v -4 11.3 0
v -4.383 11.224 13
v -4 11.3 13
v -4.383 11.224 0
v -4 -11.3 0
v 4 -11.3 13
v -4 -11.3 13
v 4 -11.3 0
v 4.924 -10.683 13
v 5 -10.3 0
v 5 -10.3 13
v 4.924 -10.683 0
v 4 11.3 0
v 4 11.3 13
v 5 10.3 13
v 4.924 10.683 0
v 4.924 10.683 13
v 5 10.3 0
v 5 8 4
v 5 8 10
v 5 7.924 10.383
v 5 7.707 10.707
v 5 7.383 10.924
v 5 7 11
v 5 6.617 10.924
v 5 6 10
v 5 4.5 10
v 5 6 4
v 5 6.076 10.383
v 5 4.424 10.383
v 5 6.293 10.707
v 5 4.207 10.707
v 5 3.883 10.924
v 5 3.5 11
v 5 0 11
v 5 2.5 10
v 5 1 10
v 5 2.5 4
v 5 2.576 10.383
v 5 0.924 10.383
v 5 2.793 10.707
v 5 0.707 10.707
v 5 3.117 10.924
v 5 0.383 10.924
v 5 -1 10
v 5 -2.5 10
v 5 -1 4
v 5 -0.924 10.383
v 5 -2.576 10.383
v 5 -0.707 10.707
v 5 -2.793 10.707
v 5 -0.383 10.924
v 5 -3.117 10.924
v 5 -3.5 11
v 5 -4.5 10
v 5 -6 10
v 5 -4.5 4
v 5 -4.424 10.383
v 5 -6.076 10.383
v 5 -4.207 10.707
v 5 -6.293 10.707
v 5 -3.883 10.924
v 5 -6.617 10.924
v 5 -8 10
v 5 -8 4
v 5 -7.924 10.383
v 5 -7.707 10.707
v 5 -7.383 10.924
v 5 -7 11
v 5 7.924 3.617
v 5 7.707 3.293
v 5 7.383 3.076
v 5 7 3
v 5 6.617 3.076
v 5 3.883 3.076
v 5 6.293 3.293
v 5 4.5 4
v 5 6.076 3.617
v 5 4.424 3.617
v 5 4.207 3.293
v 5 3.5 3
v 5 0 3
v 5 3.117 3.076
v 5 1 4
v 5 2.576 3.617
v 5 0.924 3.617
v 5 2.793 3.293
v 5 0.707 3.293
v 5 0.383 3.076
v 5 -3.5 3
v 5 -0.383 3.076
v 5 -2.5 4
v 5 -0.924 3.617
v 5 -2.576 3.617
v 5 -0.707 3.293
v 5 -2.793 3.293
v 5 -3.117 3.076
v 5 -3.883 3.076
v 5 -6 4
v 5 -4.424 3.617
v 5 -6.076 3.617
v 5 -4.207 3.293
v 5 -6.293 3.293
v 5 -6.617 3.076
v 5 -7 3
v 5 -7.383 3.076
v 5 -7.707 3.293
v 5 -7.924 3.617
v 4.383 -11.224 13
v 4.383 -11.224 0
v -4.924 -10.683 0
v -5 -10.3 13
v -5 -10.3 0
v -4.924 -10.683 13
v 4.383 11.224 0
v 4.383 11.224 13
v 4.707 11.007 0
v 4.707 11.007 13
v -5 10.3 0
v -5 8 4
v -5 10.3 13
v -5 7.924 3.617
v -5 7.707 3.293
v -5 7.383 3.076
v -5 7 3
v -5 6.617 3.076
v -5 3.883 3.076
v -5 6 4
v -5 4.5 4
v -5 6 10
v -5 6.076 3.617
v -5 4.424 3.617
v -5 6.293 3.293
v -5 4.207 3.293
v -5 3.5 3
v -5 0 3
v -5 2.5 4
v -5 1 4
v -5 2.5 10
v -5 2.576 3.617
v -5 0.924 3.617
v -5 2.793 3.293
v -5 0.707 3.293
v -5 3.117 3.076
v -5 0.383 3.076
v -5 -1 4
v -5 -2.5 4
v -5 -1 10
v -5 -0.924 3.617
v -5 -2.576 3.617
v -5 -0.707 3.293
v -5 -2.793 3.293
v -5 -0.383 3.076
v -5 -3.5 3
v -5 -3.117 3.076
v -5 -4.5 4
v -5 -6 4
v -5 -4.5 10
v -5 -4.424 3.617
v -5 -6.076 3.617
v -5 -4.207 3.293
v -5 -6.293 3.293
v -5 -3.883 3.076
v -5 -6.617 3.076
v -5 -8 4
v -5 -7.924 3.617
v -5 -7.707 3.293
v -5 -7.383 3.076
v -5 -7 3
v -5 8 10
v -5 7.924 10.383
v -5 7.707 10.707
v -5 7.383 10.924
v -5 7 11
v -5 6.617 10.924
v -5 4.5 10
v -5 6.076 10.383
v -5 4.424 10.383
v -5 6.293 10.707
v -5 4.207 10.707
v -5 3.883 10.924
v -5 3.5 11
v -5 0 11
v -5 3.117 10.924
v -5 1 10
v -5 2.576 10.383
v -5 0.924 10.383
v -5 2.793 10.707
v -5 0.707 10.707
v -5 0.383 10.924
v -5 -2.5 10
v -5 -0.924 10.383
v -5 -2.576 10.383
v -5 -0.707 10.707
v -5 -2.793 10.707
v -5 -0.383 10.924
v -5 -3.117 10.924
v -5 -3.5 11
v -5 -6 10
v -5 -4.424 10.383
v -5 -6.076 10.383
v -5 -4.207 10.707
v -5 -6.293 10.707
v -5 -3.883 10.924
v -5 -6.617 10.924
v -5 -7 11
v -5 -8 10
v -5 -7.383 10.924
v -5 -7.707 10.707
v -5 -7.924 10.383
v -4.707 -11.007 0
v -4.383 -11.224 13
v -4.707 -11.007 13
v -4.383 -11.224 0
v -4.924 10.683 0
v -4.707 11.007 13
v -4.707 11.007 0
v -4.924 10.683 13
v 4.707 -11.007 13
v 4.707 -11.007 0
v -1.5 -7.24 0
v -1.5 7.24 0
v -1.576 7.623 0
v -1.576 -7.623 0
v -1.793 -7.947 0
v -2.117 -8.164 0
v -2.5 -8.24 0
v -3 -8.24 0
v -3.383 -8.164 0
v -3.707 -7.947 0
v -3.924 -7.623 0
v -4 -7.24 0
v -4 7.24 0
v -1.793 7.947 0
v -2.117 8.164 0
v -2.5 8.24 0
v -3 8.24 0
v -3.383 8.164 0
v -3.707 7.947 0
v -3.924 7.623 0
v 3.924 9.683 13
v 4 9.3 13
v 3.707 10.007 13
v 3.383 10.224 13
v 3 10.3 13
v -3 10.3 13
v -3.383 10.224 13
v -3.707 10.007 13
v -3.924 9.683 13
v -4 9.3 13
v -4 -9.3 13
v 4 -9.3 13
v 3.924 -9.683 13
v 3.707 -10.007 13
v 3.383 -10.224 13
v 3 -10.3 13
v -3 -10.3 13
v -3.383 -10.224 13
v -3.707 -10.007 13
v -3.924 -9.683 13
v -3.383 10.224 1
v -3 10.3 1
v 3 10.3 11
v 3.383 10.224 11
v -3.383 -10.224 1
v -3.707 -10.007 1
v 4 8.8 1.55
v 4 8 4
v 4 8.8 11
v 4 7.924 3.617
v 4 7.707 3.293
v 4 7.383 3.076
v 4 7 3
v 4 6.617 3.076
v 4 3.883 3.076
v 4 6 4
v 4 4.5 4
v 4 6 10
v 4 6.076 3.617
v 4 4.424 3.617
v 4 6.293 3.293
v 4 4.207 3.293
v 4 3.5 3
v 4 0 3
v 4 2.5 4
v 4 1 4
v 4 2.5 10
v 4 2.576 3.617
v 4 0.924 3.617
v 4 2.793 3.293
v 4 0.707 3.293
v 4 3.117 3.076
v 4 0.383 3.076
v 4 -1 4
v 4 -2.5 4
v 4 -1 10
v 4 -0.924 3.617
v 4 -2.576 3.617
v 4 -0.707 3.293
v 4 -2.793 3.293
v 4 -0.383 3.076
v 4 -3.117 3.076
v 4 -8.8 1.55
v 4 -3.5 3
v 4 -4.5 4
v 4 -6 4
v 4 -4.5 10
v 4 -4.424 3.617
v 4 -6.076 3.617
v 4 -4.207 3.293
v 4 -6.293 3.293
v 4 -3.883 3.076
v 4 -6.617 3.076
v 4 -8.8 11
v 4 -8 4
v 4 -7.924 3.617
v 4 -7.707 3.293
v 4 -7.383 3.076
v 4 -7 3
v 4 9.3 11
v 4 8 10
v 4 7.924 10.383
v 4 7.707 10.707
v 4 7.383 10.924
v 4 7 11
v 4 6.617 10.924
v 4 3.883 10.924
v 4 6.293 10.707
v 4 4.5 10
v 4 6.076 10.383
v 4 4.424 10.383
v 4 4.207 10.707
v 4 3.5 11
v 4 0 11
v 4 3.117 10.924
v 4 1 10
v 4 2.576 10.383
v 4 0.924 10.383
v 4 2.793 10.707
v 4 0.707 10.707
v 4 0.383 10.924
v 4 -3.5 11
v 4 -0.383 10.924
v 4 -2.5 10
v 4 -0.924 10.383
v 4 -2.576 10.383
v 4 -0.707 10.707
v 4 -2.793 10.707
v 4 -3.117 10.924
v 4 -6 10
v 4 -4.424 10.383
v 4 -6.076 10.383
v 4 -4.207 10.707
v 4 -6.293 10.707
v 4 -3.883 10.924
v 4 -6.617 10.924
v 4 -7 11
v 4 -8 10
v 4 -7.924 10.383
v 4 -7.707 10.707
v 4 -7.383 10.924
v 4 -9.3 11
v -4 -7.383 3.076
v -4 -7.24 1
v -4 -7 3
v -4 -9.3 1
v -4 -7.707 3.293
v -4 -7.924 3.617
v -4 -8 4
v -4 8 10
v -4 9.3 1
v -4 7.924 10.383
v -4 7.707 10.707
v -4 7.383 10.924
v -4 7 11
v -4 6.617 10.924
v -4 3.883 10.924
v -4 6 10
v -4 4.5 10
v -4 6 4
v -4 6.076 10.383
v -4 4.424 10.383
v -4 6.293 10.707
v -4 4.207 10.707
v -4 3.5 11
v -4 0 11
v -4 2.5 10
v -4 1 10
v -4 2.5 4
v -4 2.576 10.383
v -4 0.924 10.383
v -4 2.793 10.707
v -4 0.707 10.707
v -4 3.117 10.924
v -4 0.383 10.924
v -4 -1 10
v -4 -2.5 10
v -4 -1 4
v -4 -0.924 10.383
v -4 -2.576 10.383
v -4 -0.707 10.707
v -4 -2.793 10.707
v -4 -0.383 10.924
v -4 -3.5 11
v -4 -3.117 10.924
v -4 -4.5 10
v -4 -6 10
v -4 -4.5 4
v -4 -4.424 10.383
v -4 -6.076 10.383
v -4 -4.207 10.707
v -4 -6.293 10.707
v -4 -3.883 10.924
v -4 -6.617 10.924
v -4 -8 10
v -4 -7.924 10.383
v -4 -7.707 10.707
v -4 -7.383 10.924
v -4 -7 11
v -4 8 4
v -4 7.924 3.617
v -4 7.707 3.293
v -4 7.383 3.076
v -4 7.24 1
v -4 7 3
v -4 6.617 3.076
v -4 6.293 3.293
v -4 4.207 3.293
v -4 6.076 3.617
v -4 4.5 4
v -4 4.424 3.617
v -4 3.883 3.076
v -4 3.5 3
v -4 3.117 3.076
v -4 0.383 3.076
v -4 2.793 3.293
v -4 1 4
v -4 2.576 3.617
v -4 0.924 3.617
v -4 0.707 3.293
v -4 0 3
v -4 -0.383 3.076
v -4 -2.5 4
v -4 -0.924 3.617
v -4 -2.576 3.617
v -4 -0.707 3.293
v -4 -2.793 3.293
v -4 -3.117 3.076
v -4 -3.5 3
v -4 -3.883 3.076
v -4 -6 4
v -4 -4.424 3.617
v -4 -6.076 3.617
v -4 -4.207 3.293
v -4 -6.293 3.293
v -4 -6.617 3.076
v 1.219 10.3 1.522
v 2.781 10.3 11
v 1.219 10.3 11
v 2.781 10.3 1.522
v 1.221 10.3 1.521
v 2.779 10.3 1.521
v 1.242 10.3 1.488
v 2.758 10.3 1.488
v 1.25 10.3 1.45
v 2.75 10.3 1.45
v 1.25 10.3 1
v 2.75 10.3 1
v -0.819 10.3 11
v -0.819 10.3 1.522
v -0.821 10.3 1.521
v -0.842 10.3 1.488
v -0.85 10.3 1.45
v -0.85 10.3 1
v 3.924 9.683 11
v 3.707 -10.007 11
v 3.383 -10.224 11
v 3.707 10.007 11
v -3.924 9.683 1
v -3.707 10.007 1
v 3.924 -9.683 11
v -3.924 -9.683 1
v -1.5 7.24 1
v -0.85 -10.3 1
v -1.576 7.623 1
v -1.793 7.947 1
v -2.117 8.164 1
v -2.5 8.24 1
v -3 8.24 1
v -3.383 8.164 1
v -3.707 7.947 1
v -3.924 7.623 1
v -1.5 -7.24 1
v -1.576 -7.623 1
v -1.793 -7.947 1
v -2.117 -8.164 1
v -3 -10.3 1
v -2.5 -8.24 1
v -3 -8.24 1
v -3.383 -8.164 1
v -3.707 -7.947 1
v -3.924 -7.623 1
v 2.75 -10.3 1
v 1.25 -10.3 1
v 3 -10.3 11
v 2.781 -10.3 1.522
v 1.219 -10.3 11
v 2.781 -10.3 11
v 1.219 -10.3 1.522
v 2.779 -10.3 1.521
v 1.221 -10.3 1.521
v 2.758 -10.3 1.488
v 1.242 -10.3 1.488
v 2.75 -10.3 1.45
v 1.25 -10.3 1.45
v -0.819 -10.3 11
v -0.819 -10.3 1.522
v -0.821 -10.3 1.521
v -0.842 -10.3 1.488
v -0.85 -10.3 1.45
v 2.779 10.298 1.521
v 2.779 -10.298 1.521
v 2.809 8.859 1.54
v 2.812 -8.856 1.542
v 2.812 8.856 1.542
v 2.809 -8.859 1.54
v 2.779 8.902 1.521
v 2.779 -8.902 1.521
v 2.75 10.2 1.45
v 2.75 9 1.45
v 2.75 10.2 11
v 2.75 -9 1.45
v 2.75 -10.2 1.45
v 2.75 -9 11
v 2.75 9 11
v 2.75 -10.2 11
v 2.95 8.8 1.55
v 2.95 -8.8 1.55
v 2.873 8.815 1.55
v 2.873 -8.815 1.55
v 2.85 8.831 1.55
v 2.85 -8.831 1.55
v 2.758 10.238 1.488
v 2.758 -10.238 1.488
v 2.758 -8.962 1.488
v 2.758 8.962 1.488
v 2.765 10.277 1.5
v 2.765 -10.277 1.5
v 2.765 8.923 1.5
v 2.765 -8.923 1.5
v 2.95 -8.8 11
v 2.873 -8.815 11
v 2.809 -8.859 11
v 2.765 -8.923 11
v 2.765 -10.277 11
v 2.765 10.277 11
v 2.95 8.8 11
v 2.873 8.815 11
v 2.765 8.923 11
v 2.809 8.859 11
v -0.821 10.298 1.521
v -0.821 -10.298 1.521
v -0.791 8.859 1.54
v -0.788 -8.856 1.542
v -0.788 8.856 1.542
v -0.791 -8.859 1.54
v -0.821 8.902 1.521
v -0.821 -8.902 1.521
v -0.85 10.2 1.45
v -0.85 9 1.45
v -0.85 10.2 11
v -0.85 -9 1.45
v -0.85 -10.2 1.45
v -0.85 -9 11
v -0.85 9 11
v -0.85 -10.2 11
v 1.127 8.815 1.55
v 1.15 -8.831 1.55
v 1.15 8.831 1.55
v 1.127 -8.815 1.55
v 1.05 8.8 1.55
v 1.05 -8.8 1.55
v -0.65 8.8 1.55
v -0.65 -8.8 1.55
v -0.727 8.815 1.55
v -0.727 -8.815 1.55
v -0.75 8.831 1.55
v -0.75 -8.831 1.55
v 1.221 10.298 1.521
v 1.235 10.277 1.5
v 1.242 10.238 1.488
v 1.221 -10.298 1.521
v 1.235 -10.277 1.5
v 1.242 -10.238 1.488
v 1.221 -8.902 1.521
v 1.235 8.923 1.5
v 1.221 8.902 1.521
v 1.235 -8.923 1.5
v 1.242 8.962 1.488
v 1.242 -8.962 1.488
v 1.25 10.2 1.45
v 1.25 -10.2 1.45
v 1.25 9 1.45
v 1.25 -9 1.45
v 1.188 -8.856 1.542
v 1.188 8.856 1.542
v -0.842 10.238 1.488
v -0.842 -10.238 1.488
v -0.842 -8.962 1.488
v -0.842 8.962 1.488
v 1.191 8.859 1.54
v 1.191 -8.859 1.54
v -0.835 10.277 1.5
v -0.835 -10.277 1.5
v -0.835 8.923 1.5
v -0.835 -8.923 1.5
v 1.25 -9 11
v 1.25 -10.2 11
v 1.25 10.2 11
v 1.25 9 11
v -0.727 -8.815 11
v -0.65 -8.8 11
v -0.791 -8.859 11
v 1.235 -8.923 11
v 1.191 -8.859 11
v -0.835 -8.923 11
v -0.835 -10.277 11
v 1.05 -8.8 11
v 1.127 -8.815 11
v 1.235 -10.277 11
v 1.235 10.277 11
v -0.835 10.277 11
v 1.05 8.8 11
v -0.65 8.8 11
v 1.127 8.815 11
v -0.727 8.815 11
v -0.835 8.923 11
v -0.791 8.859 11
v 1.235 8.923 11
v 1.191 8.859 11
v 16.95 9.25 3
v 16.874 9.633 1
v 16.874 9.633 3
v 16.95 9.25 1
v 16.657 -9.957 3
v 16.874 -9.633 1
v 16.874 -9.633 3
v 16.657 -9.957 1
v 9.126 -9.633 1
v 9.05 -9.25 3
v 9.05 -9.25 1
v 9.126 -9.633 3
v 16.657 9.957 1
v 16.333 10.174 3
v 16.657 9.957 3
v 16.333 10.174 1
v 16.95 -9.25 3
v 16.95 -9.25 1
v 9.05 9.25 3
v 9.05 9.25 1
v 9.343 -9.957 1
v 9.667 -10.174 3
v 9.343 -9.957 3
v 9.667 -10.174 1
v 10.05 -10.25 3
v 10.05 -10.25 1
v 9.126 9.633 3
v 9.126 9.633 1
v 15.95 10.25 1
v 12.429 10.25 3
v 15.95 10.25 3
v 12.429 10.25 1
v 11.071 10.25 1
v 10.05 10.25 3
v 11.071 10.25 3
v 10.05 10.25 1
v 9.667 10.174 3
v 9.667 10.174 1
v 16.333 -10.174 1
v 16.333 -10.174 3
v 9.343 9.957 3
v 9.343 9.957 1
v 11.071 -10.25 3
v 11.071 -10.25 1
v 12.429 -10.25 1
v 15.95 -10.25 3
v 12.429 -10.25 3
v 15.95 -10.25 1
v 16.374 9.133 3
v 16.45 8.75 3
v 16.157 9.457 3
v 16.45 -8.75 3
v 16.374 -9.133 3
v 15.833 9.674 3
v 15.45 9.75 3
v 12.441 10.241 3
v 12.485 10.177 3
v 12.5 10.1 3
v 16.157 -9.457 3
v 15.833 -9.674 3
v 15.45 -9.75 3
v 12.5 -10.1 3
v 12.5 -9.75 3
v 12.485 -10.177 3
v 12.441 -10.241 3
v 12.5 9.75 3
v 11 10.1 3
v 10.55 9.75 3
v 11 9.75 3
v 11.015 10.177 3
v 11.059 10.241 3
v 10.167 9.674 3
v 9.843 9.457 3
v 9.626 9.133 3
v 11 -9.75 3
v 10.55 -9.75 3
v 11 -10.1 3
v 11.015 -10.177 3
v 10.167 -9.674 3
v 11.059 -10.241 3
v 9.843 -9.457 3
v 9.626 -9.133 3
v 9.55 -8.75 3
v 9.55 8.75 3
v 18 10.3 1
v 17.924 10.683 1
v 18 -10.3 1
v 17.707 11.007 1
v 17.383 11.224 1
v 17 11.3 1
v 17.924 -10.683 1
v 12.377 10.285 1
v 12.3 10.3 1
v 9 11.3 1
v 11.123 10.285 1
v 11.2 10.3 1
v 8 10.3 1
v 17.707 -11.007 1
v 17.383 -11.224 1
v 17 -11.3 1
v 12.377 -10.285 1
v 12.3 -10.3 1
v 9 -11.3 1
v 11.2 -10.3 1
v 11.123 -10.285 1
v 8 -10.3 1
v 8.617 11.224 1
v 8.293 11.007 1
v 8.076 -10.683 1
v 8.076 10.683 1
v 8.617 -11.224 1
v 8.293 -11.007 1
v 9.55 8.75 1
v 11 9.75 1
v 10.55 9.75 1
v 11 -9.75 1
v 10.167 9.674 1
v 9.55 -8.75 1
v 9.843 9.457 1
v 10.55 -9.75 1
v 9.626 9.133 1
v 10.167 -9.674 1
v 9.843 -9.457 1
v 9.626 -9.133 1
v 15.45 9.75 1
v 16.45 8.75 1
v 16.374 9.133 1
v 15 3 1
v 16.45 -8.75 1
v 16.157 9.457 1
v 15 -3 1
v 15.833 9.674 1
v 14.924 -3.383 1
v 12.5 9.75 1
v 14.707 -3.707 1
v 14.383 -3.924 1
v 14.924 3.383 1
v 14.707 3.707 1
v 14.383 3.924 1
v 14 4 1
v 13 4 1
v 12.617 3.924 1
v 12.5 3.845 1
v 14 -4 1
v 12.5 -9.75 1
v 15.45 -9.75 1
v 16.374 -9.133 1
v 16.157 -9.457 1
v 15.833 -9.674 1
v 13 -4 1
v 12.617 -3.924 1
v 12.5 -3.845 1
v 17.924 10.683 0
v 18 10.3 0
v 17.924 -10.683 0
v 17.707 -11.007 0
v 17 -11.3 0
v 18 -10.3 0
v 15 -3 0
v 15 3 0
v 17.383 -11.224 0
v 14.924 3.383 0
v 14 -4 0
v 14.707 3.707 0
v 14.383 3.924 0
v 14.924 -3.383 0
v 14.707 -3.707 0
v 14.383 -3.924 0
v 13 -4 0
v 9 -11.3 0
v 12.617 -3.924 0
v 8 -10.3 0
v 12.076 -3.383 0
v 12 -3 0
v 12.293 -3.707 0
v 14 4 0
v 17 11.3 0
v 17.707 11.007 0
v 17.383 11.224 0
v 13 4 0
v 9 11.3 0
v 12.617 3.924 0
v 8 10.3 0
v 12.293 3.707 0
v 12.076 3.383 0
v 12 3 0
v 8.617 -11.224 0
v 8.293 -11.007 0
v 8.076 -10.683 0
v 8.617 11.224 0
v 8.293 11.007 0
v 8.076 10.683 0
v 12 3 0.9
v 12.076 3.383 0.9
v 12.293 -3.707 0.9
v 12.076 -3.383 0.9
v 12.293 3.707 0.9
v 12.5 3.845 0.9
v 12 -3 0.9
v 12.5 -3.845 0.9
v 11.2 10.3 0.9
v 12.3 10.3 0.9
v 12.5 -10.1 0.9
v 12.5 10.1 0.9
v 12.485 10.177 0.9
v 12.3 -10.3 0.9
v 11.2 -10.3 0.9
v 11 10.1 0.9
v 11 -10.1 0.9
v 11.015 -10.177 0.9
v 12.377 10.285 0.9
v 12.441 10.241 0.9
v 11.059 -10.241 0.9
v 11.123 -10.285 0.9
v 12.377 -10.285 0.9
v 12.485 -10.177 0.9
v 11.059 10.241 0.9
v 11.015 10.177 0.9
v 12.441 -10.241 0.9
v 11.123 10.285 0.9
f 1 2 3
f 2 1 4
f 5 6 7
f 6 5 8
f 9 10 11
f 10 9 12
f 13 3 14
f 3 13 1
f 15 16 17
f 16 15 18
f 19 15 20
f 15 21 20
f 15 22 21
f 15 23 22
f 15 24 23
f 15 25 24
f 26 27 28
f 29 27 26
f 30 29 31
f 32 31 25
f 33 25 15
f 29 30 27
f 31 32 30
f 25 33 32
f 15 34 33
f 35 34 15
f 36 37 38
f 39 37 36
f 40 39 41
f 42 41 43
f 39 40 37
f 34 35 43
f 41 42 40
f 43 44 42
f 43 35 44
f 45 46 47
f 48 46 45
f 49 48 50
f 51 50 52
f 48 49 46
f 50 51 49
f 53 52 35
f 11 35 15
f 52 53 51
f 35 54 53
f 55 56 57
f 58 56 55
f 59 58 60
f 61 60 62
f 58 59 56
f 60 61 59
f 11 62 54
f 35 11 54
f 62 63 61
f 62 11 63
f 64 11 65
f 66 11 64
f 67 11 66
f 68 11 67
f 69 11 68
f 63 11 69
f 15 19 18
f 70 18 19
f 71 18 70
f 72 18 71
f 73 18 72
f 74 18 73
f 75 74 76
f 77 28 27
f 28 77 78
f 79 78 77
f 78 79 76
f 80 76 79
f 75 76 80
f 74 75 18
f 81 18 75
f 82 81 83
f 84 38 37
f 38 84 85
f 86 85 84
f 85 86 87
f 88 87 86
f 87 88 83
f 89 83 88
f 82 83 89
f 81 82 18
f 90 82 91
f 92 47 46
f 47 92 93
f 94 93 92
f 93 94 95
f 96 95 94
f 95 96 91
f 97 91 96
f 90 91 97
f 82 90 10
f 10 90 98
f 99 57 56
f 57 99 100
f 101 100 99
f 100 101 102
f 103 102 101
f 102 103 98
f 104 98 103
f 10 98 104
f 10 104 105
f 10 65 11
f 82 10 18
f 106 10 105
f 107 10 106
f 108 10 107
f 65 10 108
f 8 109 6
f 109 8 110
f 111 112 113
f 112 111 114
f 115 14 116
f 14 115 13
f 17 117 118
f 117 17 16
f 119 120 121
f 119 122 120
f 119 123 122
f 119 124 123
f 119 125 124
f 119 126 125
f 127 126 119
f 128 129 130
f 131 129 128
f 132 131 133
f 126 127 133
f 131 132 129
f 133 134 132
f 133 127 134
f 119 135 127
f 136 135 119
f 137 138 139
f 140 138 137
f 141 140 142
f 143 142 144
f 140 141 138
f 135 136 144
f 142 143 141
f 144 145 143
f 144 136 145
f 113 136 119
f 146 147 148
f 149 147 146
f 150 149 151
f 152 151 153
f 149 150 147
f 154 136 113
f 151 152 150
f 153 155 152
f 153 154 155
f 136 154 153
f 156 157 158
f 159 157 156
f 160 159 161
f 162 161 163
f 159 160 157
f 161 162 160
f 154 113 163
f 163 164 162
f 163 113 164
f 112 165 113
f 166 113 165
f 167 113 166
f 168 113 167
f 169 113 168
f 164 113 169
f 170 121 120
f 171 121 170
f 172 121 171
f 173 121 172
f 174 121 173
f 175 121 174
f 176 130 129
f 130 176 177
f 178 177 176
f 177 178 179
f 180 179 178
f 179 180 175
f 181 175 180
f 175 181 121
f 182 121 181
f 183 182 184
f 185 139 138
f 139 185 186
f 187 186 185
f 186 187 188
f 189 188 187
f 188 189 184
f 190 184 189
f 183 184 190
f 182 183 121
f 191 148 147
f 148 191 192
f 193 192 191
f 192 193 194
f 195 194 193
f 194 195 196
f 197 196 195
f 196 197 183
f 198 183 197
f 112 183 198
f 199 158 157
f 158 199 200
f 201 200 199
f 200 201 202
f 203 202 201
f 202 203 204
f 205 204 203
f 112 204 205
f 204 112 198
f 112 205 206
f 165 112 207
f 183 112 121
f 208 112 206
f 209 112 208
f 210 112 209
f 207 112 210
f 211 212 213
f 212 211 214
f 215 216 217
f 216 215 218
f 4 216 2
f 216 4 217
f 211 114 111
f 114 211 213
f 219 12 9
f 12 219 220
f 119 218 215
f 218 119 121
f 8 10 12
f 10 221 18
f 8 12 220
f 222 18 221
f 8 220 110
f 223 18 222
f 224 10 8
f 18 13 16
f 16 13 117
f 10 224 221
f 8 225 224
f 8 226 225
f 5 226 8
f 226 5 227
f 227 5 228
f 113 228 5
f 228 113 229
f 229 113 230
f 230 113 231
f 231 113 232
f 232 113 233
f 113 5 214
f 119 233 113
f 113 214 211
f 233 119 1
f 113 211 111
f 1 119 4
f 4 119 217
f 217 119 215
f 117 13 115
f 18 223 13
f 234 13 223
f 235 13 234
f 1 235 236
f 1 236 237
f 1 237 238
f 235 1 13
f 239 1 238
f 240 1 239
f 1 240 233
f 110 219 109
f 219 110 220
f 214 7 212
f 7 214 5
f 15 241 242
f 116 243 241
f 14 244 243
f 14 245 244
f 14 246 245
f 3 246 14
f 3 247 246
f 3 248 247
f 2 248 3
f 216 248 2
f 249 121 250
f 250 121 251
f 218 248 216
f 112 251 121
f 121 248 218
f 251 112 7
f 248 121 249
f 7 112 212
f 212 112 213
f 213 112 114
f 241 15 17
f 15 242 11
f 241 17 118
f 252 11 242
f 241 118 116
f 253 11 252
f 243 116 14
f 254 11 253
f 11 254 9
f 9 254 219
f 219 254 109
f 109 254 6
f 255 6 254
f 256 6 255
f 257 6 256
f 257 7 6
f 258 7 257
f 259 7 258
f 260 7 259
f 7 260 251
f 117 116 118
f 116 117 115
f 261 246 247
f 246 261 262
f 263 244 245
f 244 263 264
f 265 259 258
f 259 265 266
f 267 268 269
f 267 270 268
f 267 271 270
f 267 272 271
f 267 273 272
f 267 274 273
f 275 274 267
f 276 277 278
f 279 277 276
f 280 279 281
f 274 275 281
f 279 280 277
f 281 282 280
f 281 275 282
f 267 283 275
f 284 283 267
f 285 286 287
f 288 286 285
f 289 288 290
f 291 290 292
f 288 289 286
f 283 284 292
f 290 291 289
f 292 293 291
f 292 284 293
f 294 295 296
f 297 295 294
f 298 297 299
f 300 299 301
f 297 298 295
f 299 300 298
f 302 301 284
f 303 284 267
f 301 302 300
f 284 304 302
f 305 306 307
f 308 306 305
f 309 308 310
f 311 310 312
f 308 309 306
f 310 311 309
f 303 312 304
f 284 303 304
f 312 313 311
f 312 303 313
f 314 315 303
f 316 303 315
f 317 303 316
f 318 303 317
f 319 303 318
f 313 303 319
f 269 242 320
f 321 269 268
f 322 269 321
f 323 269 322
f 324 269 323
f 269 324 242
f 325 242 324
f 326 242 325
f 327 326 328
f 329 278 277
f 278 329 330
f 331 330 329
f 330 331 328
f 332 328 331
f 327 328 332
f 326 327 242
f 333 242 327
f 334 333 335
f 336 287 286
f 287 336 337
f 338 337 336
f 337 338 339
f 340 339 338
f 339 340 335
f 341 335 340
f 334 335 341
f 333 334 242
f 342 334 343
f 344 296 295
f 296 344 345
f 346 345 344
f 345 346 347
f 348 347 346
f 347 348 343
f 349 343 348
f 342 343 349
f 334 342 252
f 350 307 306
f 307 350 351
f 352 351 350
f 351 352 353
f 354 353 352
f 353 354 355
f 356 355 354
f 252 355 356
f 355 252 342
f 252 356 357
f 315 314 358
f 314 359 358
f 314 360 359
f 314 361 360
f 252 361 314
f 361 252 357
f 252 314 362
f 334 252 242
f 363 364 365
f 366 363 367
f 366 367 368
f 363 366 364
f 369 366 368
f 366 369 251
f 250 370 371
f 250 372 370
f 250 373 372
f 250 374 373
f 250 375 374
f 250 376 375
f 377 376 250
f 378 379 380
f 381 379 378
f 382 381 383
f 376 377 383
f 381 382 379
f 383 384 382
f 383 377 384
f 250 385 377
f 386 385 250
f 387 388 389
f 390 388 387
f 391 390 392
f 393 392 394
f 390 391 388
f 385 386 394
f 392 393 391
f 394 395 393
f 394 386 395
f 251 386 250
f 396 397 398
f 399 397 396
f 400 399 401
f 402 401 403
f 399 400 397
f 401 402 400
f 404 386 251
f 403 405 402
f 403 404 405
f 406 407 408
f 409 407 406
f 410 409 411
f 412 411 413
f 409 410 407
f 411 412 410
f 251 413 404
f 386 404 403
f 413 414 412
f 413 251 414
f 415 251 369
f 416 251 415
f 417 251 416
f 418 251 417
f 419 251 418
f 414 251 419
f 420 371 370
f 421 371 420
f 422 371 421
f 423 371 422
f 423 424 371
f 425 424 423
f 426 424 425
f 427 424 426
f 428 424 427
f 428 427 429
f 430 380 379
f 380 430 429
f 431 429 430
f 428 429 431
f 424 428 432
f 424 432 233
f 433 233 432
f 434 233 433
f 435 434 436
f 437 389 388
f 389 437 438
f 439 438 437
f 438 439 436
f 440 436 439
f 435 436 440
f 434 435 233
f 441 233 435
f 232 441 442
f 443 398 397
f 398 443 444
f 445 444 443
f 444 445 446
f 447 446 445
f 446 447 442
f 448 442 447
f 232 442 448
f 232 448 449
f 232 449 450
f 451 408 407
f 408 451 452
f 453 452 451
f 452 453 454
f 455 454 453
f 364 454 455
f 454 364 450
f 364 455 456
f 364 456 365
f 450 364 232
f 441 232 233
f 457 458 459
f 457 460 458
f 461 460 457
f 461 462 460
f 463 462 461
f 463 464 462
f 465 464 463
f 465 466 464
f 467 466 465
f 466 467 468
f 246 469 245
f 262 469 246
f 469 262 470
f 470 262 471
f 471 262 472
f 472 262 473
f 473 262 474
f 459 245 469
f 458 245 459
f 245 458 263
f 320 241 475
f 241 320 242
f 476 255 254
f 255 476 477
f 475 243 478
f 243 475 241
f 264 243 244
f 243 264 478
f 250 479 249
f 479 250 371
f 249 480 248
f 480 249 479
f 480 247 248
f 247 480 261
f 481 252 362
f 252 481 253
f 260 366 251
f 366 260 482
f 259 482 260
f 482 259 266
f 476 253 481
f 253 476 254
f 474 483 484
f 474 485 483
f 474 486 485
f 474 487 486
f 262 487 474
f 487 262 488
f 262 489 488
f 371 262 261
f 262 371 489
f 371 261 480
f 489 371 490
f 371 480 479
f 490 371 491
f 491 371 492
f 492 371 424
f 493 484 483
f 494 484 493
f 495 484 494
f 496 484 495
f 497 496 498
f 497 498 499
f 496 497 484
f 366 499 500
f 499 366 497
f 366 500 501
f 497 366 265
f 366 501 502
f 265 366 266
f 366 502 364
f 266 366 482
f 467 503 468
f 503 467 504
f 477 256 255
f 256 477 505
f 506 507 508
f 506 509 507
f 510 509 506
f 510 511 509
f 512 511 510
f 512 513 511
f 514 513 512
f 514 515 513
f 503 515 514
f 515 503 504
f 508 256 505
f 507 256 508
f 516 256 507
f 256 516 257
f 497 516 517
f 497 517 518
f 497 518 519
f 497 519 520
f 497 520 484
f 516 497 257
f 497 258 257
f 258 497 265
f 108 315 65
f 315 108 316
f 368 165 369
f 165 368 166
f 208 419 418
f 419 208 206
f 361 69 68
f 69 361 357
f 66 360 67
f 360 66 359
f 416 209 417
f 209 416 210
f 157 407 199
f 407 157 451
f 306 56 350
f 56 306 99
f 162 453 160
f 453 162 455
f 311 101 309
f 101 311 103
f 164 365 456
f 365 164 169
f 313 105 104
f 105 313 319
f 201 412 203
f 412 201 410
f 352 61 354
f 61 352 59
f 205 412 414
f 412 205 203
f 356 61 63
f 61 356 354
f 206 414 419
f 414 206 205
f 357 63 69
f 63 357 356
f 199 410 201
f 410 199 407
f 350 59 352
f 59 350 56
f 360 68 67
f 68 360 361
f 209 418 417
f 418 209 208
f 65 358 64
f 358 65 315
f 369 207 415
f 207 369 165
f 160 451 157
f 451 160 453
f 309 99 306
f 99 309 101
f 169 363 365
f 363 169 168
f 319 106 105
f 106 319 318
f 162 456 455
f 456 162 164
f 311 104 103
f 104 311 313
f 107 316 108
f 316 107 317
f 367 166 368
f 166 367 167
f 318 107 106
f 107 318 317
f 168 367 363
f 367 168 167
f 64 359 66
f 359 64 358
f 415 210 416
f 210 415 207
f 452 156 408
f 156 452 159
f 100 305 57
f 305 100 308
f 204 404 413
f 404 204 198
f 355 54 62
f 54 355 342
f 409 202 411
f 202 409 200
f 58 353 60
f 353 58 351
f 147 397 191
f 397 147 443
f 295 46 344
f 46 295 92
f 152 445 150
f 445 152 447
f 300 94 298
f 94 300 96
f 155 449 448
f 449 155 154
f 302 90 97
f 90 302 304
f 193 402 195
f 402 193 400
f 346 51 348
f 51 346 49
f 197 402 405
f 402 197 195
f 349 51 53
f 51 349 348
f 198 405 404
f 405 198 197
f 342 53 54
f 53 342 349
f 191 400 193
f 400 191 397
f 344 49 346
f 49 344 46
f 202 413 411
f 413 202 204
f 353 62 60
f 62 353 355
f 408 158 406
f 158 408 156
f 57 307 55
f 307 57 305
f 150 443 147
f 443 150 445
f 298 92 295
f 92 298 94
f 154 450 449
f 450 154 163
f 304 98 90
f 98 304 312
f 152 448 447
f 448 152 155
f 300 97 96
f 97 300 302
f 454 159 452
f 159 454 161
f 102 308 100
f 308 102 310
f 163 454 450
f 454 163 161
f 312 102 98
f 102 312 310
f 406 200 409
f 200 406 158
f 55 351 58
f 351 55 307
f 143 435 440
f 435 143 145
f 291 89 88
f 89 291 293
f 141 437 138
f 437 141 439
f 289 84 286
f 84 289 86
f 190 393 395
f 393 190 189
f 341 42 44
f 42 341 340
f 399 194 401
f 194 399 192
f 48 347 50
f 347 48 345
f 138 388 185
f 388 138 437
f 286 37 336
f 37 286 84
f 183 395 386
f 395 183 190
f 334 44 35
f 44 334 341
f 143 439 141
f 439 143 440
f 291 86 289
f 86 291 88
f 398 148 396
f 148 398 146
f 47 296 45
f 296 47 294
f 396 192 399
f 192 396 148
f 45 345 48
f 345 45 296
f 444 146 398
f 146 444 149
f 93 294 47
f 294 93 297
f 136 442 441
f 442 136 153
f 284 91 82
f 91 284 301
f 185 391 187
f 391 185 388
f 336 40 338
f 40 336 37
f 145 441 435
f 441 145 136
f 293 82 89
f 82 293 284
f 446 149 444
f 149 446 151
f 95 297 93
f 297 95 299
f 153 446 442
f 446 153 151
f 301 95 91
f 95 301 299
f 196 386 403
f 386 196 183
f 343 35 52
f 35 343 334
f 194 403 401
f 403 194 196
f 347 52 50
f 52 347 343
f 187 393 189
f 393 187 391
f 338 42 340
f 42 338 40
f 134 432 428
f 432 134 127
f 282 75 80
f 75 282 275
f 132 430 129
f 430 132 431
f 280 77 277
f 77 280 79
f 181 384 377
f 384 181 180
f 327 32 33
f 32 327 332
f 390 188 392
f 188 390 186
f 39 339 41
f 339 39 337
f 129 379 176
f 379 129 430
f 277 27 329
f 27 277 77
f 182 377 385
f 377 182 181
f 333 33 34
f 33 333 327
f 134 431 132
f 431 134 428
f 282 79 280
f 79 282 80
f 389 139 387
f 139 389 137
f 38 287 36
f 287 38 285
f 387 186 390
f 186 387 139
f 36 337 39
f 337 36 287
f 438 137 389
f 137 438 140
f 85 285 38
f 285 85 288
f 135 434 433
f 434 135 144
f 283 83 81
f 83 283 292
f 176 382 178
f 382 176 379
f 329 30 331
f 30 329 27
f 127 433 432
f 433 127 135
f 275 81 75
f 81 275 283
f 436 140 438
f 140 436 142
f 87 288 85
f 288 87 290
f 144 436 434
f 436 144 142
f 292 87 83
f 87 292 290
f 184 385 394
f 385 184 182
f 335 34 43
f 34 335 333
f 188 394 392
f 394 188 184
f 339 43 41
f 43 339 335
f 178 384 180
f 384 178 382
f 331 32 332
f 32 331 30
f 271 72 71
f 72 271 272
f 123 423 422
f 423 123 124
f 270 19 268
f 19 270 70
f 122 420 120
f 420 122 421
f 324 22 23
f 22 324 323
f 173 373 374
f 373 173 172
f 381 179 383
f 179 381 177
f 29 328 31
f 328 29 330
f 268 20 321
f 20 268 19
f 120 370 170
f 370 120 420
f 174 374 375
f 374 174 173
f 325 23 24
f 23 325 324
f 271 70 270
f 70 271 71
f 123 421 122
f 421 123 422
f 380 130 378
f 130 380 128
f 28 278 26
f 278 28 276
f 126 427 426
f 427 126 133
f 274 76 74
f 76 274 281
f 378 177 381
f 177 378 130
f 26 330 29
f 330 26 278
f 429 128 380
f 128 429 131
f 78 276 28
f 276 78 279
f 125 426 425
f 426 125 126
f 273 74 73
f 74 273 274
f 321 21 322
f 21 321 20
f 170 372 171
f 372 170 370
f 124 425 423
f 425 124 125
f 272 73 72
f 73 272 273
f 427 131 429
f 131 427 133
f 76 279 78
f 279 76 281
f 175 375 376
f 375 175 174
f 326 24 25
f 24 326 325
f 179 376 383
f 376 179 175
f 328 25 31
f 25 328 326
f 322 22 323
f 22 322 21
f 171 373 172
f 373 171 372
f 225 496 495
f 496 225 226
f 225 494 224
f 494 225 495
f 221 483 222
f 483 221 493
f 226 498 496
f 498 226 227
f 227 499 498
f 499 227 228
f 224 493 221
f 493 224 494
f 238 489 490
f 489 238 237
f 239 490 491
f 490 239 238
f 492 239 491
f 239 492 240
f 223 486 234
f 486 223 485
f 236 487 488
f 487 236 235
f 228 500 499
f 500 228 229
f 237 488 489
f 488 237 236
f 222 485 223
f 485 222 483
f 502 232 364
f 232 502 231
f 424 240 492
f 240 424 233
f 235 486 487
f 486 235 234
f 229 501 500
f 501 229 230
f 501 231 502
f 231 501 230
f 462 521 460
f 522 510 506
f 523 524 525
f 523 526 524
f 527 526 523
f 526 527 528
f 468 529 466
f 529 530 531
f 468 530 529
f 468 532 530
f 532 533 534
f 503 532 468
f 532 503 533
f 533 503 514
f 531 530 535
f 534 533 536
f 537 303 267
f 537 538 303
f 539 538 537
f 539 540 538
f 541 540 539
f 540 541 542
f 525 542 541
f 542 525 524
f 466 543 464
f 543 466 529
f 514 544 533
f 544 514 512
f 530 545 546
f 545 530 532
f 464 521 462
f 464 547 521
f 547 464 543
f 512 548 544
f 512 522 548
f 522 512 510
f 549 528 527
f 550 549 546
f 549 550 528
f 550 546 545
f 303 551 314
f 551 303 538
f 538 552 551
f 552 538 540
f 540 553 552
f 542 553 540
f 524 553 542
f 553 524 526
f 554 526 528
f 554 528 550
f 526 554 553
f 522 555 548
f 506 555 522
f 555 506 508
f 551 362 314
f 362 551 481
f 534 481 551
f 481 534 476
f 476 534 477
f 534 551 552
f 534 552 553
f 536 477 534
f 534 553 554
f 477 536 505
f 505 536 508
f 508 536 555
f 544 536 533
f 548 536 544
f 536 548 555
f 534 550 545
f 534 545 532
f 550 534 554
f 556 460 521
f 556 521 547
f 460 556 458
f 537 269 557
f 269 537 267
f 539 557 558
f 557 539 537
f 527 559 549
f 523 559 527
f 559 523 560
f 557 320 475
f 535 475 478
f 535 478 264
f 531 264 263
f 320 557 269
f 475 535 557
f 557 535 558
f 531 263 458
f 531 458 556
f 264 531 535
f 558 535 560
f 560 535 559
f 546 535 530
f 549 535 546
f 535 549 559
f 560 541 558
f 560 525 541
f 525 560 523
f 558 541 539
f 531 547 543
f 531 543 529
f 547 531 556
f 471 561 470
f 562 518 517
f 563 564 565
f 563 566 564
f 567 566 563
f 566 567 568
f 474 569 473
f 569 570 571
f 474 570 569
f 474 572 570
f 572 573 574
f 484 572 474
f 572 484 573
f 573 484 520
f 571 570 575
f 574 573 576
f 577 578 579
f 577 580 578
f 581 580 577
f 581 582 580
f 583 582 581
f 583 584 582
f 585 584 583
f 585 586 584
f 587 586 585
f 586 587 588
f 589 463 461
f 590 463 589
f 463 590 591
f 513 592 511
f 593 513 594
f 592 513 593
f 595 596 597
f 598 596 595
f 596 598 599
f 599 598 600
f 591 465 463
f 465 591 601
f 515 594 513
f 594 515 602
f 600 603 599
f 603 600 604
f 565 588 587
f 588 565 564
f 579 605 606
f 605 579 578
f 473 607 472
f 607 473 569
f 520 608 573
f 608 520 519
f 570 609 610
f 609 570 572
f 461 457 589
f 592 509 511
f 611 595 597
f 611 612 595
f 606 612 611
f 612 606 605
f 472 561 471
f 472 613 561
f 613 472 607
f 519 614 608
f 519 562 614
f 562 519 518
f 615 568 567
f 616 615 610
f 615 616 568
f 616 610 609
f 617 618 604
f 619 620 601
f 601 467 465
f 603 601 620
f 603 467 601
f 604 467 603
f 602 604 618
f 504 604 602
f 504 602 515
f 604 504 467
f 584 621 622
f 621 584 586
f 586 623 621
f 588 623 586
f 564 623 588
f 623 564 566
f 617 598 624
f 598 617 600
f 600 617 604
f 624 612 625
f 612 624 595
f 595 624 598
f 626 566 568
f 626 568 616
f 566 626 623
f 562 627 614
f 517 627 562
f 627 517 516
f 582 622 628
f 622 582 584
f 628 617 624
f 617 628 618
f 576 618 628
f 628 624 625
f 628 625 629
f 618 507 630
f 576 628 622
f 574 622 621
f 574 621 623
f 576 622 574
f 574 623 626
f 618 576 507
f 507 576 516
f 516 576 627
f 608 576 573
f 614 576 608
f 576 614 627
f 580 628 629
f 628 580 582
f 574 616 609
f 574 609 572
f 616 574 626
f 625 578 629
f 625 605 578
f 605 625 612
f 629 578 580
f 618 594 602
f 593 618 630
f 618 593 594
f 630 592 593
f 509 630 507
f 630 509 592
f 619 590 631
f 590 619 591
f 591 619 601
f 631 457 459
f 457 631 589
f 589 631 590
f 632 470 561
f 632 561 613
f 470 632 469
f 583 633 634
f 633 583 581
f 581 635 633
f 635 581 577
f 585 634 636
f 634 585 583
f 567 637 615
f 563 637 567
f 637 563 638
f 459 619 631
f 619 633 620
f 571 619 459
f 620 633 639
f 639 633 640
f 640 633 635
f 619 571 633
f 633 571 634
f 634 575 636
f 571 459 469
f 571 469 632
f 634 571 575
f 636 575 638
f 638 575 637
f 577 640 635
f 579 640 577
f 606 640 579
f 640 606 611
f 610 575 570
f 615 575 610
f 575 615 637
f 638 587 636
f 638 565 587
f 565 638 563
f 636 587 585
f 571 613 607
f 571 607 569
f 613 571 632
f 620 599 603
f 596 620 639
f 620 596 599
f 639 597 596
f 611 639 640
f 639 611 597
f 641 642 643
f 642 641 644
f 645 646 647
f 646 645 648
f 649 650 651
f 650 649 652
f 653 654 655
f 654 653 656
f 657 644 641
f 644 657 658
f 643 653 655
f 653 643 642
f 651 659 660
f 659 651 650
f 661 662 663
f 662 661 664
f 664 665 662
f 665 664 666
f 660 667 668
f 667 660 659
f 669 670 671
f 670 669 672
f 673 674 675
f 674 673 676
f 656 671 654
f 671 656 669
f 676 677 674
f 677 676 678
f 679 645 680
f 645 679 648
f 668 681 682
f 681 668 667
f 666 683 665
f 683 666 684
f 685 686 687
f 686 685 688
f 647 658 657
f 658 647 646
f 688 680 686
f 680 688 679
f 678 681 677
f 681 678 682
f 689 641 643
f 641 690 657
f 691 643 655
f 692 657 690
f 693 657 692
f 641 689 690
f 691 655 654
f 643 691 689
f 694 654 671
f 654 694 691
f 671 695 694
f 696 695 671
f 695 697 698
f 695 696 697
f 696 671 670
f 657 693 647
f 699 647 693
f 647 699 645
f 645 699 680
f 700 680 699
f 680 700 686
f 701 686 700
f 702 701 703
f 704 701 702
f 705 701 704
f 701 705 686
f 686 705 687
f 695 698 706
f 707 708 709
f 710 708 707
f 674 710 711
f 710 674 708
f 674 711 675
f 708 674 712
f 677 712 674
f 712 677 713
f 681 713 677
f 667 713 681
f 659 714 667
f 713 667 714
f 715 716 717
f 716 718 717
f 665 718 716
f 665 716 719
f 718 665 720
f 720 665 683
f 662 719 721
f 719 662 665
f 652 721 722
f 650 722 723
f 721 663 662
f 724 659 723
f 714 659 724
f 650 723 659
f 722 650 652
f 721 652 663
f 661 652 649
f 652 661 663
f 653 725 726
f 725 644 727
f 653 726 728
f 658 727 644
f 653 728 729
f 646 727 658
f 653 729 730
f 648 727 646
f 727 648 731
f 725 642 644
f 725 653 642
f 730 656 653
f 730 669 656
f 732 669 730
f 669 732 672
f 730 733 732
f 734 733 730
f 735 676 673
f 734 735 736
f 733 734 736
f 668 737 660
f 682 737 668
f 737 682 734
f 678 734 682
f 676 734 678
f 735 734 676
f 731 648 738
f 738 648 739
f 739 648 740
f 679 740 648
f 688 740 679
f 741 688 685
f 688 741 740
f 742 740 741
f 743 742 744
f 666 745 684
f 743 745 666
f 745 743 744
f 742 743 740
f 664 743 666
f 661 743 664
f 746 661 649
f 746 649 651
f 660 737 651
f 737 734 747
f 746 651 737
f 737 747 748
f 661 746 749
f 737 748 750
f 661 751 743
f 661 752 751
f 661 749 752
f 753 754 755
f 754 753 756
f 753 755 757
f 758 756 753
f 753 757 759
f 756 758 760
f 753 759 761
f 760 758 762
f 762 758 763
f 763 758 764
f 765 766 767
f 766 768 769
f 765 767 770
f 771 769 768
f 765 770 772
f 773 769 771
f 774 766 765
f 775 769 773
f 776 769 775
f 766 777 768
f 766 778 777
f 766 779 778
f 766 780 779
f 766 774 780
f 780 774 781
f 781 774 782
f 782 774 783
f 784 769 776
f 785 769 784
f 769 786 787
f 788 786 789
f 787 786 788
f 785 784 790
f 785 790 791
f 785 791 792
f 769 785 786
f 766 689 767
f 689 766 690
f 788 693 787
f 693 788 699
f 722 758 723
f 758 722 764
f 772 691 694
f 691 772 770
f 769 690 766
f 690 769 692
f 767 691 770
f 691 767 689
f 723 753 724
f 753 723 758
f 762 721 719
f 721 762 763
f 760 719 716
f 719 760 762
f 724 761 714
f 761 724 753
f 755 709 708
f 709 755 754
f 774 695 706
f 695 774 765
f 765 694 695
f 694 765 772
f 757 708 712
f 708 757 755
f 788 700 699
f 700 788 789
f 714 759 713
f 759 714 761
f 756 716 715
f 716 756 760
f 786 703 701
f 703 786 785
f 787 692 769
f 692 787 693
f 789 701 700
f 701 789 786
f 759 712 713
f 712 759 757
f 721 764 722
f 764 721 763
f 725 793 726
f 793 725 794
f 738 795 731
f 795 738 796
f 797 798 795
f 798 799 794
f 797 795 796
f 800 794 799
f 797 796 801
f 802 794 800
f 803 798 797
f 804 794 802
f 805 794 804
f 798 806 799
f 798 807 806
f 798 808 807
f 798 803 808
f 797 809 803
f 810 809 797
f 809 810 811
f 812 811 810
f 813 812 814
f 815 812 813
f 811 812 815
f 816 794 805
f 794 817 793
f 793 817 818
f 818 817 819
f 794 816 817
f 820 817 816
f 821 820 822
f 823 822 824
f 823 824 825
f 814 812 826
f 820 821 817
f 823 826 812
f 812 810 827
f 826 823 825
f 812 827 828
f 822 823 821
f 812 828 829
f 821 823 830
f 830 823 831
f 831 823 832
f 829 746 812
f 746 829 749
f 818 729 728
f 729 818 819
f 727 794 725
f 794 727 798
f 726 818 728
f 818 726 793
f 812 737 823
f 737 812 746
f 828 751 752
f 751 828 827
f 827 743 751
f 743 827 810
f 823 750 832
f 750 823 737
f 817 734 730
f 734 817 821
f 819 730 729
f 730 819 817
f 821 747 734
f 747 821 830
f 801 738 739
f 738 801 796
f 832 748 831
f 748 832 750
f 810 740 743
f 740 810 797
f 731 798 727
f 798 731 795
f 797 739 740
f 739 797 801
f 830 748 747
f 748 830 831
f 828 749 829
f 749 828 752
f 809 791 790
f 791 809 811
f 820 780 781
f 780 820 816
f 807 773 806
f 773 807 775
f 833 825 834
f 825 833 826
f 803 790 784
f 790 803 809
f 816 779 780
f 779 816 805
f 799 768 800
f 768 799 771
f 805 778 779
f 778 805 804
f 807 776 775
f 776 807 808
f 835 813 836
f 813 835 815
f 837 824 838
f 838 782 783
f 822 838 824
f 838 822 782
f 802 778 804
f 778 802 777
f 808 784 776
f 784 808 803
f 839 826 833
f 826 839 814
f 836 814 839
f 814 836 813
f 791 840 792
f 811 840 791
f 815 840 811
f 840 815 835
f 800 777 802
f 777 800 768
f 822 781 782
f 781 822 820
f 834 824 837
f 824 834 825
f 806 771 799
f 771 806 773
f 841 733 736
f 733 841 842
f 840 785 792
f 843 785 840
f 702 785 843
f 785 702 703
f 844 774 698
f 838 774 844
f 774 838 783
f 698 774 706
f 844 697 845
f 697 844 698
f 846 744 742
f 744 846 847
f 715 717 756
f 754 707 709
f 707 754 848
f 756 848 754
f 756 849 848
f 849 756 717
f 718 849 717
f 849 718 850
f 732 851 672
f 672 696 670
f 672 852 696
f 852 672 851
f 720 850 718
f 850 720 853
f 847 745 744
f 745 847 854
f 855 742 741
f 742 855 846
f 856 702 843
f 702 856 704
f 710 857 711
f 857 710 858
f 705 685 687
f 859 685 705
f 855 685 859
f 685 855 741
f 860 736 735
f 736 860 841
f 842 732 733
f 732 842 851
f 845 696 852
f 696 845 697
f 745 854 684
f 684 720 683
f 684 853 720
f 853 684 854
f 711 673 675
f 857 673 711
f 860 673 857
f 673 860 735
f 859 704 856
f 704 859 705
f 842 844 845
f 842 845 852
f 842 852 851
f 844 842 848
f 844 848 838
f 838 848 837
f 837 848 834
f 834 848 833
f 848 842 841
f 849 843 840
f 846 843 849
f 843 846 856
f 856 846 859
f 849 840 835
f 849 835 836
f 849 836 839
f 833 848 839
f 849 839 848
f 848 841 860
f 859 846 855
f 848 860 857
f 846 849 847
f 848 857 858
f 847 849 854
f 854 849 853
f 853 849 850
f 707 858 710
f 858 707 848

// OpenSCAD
//
// Adafruit Micro USB Breakout Board Enclosure
//
// by Yasuhiro Wabiko
//
// This work is licensed under a Creative Commons Attribution 4.0 International License.
// https://creativecommons.org/licenses/by/4.0/
//

use <prim.scad>

LID_ERROR = 0.1; // Wood PLA: 0.3 too large (too loose)


// inner size of the box.
// typically, (x,y) = board size, z depends on how much space you need for cabling.
//
size_x = 10;
size_y = 20.6; // 20.2 too small
size_z = 8;

// shell dimensions
shell_thick = 1; // thickness
shell_r     = 1; // radius in minkowski transform

// board parameters
board_thick      = 1.5;    // board thickness, typically 2mm
arm_thick        = 1.5;    // arm thickness (overhang)
arm_up_z         = 2;      // arm upper part height (in z-axis)
arm_low_z        = 2.0;    // arm upper part height (in z-axis)
arm_center_thick = 0.6;
arm_center_up_y  = size_y; // arm (center) upper part width
arm_center_low_y = size_y; // arm (center) lower part width
arm_left_up_x    = size_x; // arm (left) upper part height
arm_left_low_x   = size_x; // arm (left) lower part height
arm_right_up_x   = size_x;      // arm (right) upper part height
arm_right_low_x  = size_x; // arm (right) lower part height
arm_r            = 0.2;    // radius in minkowski transform
arm_z            = arm_low_z + board_thick + arm_up_z;

// lid dimensions
lid_outer_x = 1;
lid_inner_x = 2;

// misc design parameters
spfn_small  = 8;
spfn_medium = 16;
spfn_large  = 64;
lid_inner_thick = 2;

// internal parameters
WELDING = 0.1;
WELDING_SMALL = 0.3;
SHELL_LID_DIST = 3; // distance between shell and lid when print_ready_layout

// render target; this is meant to be overriden by Makefile
TARGET="default";

//
// top level logic
//
microusb_main();

module microusb_main(target=TARGET){
    
if (target == "default") {
    microusb(with_vent=1, with_cabling=0, with_shell=1, with_print=1, with_lid_overlap=1);
}

if (target == "unit_test") {
    ox = 40;
    translate([0,size_y/2,-size_z/2]) {
        microusb_unit(ox=ox, with_vent=1, with_cabling=0, with_shell=0, with_support=1, with_arm=1, with_cut=1, with_lid=0, with_screw=1);

        translate([-ox-3,0,0]) {
            microusb_unit_lid_negative_voume(with_screw=1);
        }
    }
}



//microusb_unit_with_support(sh=36-8.5, with_vent=1, with_cabling=1, with_shell=0);
//rotate([0,90,0])
//microusb_unit_with_support(sh=40-size_x, with_vent=1, with_cabling=1, with_shell=0);

}



// -------------------------
// Public Modules
// -------------------------

// [Public]
// Minimum size enclosure.
//
// with_vent = { 1: with ventilation slits, 0: without ventilation slits }
// with_lid  = { 1: render the lid, 0: does not render the lid }
// with_cabling = { 1: render a big openings on the enclosure for easier cabling, 0: without such openings }
// with_shell = { 1: render the shell (outermost enclosure that matches the requested dimension). 0: does not render the shell.}
// with_print = { 1: print layout (models are rotated to be printable), 0: edit layout (no rotation) }
// with_open_roof = { 1: make a big opening on the 'roof' part (for debugging), 0: do not do that }
// with_lid_overlap = { 1: subtract lid_inner_x from size_x so that shell inner space becomes exactly same as (size_x, size_y, size_z), i.e. board size, 0: the actual inner space x-size is size_x + lid_inner_x. }
module microusb(with_vent=1, with_lid=1, with_cabling=0, with_shell=1, with_print=1, with_open_roof=0, with_screw=0, with_lid_overlap=1){

    size_ex = size_x - lid_inner_x*with_lid_overlap;
    
    if (with_print) {
        rotate([0,-90,0])
            translate([size_x/2+shell_thick+lid_inner_x/2, 0, 0])
            microusb_body(with_vent=with_vent, with_lid=with_lid, with_cabling=with_cabling, with_shell=with_shell, with_open_roof=with_open_roof);
        if (with_lid) {
            translate([size_z+shell_thick*2+SHELL_LID_DIST,0,0])
                rotate([0,90,0])
                microusb_lid(sx=size_x, sy=size_y, sz=size_z, wr=shell_r, wt=shell_thick, lox=lid_outer_x, lix=lid_inner_x,
                             fns=spfn_small, fnm=spfn_medium, fnl=spfn_large, with_screw=with_screw);
        }
    } else {
        // debug
        translate([0, 0, 0]) {
            // debug
            difference() {
                union() {
                    translate([0, 0, 0])
                        microusb_body(with_vent=with_vent, with_lid=with_lid, with_cabling=with_cabling, with_shell=with_shell, with_open_roof=with_open_roof);
                    if (with_lid) {
                        microusb_lid(sx=size_x, sy=size_y, sz=size_z, wr=shell_r, wt=shell_thick, lox=lid_outer_x, lix=lid_inner_x,
                                     fns=spfn_small, fnm=spfn_medium, fnl=spfn_large, with_screw=with_screw);
                    }
                }
                // debug
                translate([-size_x/2, size_y/2+shell_thick/2, 0]) {
                    //#cube([size_x*4, shell_thick, arm_z], center=true);
                }
            }
        }
    }
}

// [Public]
// Variable size enclosure(in x-axis only). Typically to be embededd in another project.
// 
// ox, oy, oz = dimension (this has to be equals to or larger than (size_x, size_y, size_z).
// with_vent = { 1: with ventilation slits, 0: without ventilation slits }
// with_lid  = { 1: render the lid, 0: does not render the lid }
// with_cabling = { 1: render a big openings on the enclosure for easier cabling, 0: without such openings }
// with_shell = { 1: render the shell (outermost enclosure that matches the requested dimension). 0: does not render the shell.}
// with_print = { 1: print layout (models are rotated to be printable), 0: edit layout (no rotation) }
// with_open_roof = { 1: make a big opening on the 'roof' part (for debugging), 0: do not do that }
module microusb_unit(ox=0, with_vent=0, with_lid=0, with_cabling=0, with_shell=1, with_support=1, with_arm=1, with_open_roof=0, with_cut=0, with_screw=0) {
    bx = size_x + with_shell*shell_thick + lid_inner_x; // body size
    sh = ox - bx;
    echo (bx=bx);
    echo (sh=sh);
//    translate([0,size_y/2+shell_thick,0]) { // debug
    translate([-ox/2,0,0]) {
        rotate([0,0,0]) {
            translate([0,0,0]) {
                microusb_unit_with_support(ox=ox, os=sh, with_vent=with_vent, with_cabling=with_cabling, with_shell=with_shell, with_support=with_support, with_arm=with_arm, with_open_roof=with_open_roof, with_cut=with_cut, with_screw=with_screw);
            }
            
            if (with_lid) {
                translate([-ox-size_x/2,0,0]) {
                    microusb_unit_lid_only();
                }
            }
        }
    }
}
    



// [Public]
// Lid
module microusb_unit_lid_only(with_screw=0) {
    rotate([0,0,180]) {
        microusb_lid(sx=size_x, sy=size_y, sz=size_z, wr=shell_r, wt=shell_thick, lox=lid_outer_x, lix=lid_inner_x,
                     fns=spfn_small, fnm=spfn_medium, fnl=spfn_large, with_screw=with_screw);
    }
}

// [Public]
// Negative volume of lid that can be shared with the outer model (useful when you are embedding this model in another project).
module microusb_unit_lid_negative_voume(ox=0, with_screw=0, scale_factor=1.0) {
    rotate([0,0,180]) {
        translate([-lid_outer_x, 0, 0]) {
            translate([lid_outer_x/2,0,0]) {// centering to match with positive volume
                #microusb_lid_negative_volume(size_x, size_y, size_z, shell_r, shell_thick,
                                             spfn_small, spfn_medium, spfn_large, with_screw=with_screw, scale_factor=scale_factor);
            }
        }
    }
}

// -------------------------
// Private Modules
// -------------------------

module microusb_body(with_vent=0, with_lid=0, with_cabling=0, with_shell=0, with_arm=1, with_open_roof=0){
    dx = (with_cabling)*lid_inner_x;
    dz = (with_shell)*shell_thick/2;
    union() {
        difference() {
            union() {
                cube([0,0,0]); // dummy cube to make difference() work regardless of conditions
                if (with_shell){
                    microusb_shell(sx=size_x, sy=size_y, sz=size_z, wr=shell_r, wt=shell_thick,
                                   fns=spfn_small, fnm=spfn_medium, fnl=spfn_large, with_open_roof=with_open_roof);
                }
                // side support. (if with_shell=1, it is embedded inside shell, so invisible.)
                for (i=[-1,1]) {
                    //translate([-size_x/2-shell_thick*2+WELDING_SMALL+arm_left_up_x/2, (-size_y/2-shell_thick+WELDING_SMALL)*i, -board_thick]) {
                    //cube([arm_left_up_x, WELDING_SMALL*2, arm_z], center=true);
                    //}
                }
            }
            union() {
                if (with_shell) {
                    microusb_shell_negative_volume(sx=size_x, sy=size_y, sz=size_z, wr=shell_r, wt=shell_thick,
                                                   fns=spfn_small, fnm=spfn_medium, fnl=spfn_large, with_vent=with_vent, with_cabling=with_cabling, with_shell=with_shell);
                }
            }
        }

        if (with_arm) {
            translate([0,0,-(size_z-arm_z)/2-dz]){
                microusb_shell_arm(size_x, size_y, size_z, shell_r, shell_thick,
                                   spfn_small, spfn_medium, spfn_large);
            }
        }
    }
}


module microusb_unit_with_support(ox=0, os=0, with_vent=0, with_cabling=0, with_shell=0, with_support=1, with_arm=1, with_open_roof=0, with_cut=0, with_screw=0) {
    bx = size_x + with_shell*shell_thick + lid_inner_x; // body size
    // when (!with_cut), match height with shell dimension
    dz = shell_thick*2*with_shell;
    dz2 = (size_z/2+shell_thick-arm_z/2)*(with_cut);
    dt = (1-with_shell)*shell_thick;
    sh = os + dt;
    echo (dz=dz);
    echo (sh=sh);
    echo (with_shell=with_shell);
    // centering
    translate([-lid_inner_x+ox/2,0,0])
//     translate([-lid_inner_x+(bx+sh)/2,0,size_z/2+shell_thick])
    {
        difference() { // cut unnecessary welding at the top and bottom
            union() {
                if (with_support) {
                    // support structure
                    difference(){
                        translate([-sh/2+lid_inner_x, 0, 0]) {
                            prim_round_xplate0(sh, size_y+shell_thick*2, size_z+dz, 1, spfn_medium);
                        }
                        translate([-sh-size_x/2-WELDING_SMALL, 0, 0]) {
                            //#prim_round_xplate0(size_x+WELDING_SMALL*2, size_y, size_z+WELDING, 0.1, spfn_medium);
                        }
                    }
                }

                translate([-sh-size_x/2+dt,0,0]) {
                    rotate([0,0,180]) {
                        microusb_body(with_vent=with_vent, with_cabling=with_cabling, with_shell=with_shell, with_arm=with_arm, with_open_roof=with_open_roof);
                    }
                }
            }
            union() { // cut unnecessary parts at the top and bottom
                cube([0,0,0]); // dummy
                if (with_cut) {
                    // bottom
                    translate([-(sh+size_x)/2+lid_inner_x, 0, -size_z/2-arm_z/2]) {
                        #cube([sh+size_x, size_y+shell_thick*4, arm_z], center=true);
                    }
                    // top
                    translate([-(sh+size_x)/2+lid_inner_x, 0, size_z/2+arm_z/2-(size_z-arm_z)]) {
                        #cube([sh+size_x, size_y+shell_thick*4, arm_z], center=true);
                    }
                }
            }
        }
    }

    if (with_screw) {
        for (iy=[-1,1]) {
            shz = 6; // screw_hole_z
            translate([-ox/2,(-size_y/2+3)*iy-iy,shz/2+1.4]) {
                rotate([0,0,180]) {
                    screw_hole_d2_h3(align="x", volume_type="positive",
                                     shell_x=6, shell_y=6, shell_z=ox-2, with_shell=1);
                }
            }
        }
    }
}



//
// (sx,sy,sz) = dimension of stuffing
//
// centered at the center of stuffing (excluding lid_inner_x)
//
module microusb_shell(sx, sy, sz, wr, wt,
                      fns, fnm, fnl, with_open_roof=0){

    // requested dimensions
    ox = sx+wt+lid_inner_x;
    oy = sy+wt*2;
    oz = sz+wt*2;
    
    translate([ox/2-sx/2-wt-lid_inner_x/2, oy/2-sy/2-wt, oz/2-sz/2-wt]) {
        difference(){
            // shell outer frame
            translate([0,0,0]){
                prim_round_xplate0(ox, oy, oz, wr, fnm);
            }
            // shell space for stuffing
            translate([wt, 0, 0]) {
                #prim_round_xplate0(sx+lid_inner_x+wt, sy, sz+10*with_open_roof, wr, fnm);
            }
        }
    }

}

module microusb_shell_arm(sx, sy, sz, wr, wt,
                      fns, fnm, fnl){
    // requested dimensions
    ox = sx+wt+lid_inner_x;
    oy = sy+wt*2;
    oz = sz+wt*2;

    with_center = 1;
    with_right = 1;
    with_left = 1;
    
    for (i=[0,1]){ // i = { 0:arm lower, 1:arm upper }
        dz = (arm_low_z/2+board_thick+arm_up_z/2+WELDING)*i;
        rx = [arm_right_low_x, arm_right_up_x][i];
        lx = [arm_left_low_x, arm_left_up_x][i];
        cy = [arm_center_low_y, arm_center_up_y][i];
        translate([-wt*2, 0, -sz/2+wt+arm_low_z/2-WELDING/2+dz]){

            // center
            if (with_center) {
                y0 = -size_y/2+cy/2;
                translate([-sx/2+arm_center_thick/2-WELDING+wt, y0, 0]) {
                    prim_round_yplate0(arm_center_thick+WELDING, arm_center_low_y+WELDING*2, arm_low_z+WELDING, 0.1, fnm);
                }
            }

            // left
            if (with_left) {
                x0 = -size_x/2+lx/2+wt;
                translate([x0-WELDING/2, -sy/2+arm_thick/2-WELDING/2, 0]) {
                    prim_round_xplate0(lx+WELDING, arm_thick+WELDING, arm_low_z+WELDING, arm_r, fnm);
                }
            }

            // right
            if (with_right) {
                x0 = -size_x/2+rx/2+wt;
                translate([x0-WELDING/2, sy/2-arm_thick/2+WELDING/2, 0]) {
                    prim_round_xplate0(rx+WELDING, arm_thick+WELDING, arm_low_z+WELDING, arm_r, fnm);
                }
            }
        }
    }
}



module microusb_shell_negative_volume(sx, sy, sz, wr, wt,
                                      fns, fnm, fnl, with_vent=0, with_cabling=0, with_shell=0){
    with_cabling_top = with_cabling;
    with_cabling_bottom = 0;

    // cable hole at the top of shell
    if (with_cabling_top) {
        translate([0, 0, sz/2])
            prim_round_zplate0(sx*2, sy*2, sz*0.5, 1, fnm);
    }

    // cable hole at the bottom of shell
    if (with_cabling_bottom) {
        for (i=[-2:1:2]) {
            translate([0, i*2.54, 0])
                prim_round_zplate0(sx*0.9, 2.0, sz+wt*2+WELDING, 1, fnm);
        }
    }

    if (with_vent){
        // top/bottom vent
        for (i=[-2:1:2]) {
            translate([0, i*3.5, 0])
                #prim_round_zplate0(sx*0.8, 2, sz+wt+2, 1, fnm);
                }

        // side vent
//        for (i=[0.5]) {
//            translate([0, 0, i*4])
//                #prim_round_yplate0(sx*0.8, sy+wt+2, 2, 1, fnm);
//        }

        // front vent
        vz = sz-arm_z;
        for (i=[0.5]) {
            translate([0, 0, -sz/2+arm_z+vz/2])
                #prim_round_xplate0(sx+wt*2+2, sy*0.8, vz, 1, fnm);
        }
    }
    
    // front
    if (with_shell) {
        translate([-sx/2-wt, 0, -sz/2+arm_low_z+board_thick/2]) {
            //prim_round_xplate0(wt*2+4, 16, board_thick, 0.1, fnm);
        }
    }
}


module microusb_lid(sx, sy, sz, wr, wt, lox, lix,
                      fns, fnm, fnl, with_screw=0){
    translate([-lox, 0, 0])
    difference(){
        microusb_lid_body(sx, sy, sz, wr, wt,
                          fns, fnm, fnl);
        union() {
            translate([lid_outer_x/2,0,0]) { // centering to match with positive volume
                microusb_lid_negative_volume(sx=sx, sy=sy, sz=sz, wr=wr, wt=wt, lox=lox,
                                             fns=fns, fnm=fnm, fnl=fnl, with_screw=with_screw);
                microusb_lid_negative_volume_private(sx=sx, sy=sy, sz=sz, wr=wr, wt=wt, lox=lox, lix=lix,
                                                     fns=fns, fnm=fnm, fnl=fnl);
            }
        }
    }
}

module microusb_lid_body(sx, sy, sz, wr, wt,
                      fns, fnm, fnl){

    // inner
    translate([-lid_inner_x/2,0,0])
    difference(){
        prim_round_xplate(lid_inner_x, sy-LID_ERROR, sz-LID_ERROR, wr, fnm);
        translate([0, 0, 0])
            prim_round_xplate(lid_inner_x+WELDING*2, sy-wt-LID_ERROR, sz-wt-LID_ERROR, wr, fnm);
    }    

    // outer
    translate([lid_outer_x/2,0,0])
        prim_round_xplate(lid_outer_x, sy+wt*2, sz+wt*2, wr, fnm);

}

// shared with lid outer
module microusb_lid_negative_volume(sx, sy, sz, wr, wt,
                                    fns, fnm, fnl, with_screw=0, scale_factor=1.0){
    usb_z = 3;
    usb_y = 8;
    // microusb in 
    translate([0,0,-sz/2+arm_low_z+board_thick+usb_z/2-0.5]) { // TODO: ad-hoc specific to _unit; how about _body?
        #prim_round_xplate(lid_outer_x*3+WELDING*2, usb_y, usb_z, wr, fnm);
    }

    // screw holes
    if (with_screw) {
        for (iy=[-1,1], iz=[-1]) {
            shz = 6; // screw_hole_z
            translate([-wt,(-size_y/2+3)*iy-iy,shz/2+1.4]) {
                rotate([0,0,180]) {
                    scale([scale_factor,1,1]) {
                        screw_hole_d2_h3(align="x", volume_type="negative",
                                         shell_x=6, shell_y=6, shell_z=0, with_shell=1);
                    }
                }
            }
        }
    }
}

// with lid inner
module microusb_lid_negative_volume_private(sx, sy, sz, wr, wt, lox, lix,
                                    fns, fnm, fnl){

    // slit to accomodate board edge
    translate([-lox-lix/2, 0, -sz/2+arm_low_z+board_thick/2]) {
        #prim_round_xplate(lox+lix+WELDING*2, sy, board_thick, 0.2, fnm);
    }
        
}
